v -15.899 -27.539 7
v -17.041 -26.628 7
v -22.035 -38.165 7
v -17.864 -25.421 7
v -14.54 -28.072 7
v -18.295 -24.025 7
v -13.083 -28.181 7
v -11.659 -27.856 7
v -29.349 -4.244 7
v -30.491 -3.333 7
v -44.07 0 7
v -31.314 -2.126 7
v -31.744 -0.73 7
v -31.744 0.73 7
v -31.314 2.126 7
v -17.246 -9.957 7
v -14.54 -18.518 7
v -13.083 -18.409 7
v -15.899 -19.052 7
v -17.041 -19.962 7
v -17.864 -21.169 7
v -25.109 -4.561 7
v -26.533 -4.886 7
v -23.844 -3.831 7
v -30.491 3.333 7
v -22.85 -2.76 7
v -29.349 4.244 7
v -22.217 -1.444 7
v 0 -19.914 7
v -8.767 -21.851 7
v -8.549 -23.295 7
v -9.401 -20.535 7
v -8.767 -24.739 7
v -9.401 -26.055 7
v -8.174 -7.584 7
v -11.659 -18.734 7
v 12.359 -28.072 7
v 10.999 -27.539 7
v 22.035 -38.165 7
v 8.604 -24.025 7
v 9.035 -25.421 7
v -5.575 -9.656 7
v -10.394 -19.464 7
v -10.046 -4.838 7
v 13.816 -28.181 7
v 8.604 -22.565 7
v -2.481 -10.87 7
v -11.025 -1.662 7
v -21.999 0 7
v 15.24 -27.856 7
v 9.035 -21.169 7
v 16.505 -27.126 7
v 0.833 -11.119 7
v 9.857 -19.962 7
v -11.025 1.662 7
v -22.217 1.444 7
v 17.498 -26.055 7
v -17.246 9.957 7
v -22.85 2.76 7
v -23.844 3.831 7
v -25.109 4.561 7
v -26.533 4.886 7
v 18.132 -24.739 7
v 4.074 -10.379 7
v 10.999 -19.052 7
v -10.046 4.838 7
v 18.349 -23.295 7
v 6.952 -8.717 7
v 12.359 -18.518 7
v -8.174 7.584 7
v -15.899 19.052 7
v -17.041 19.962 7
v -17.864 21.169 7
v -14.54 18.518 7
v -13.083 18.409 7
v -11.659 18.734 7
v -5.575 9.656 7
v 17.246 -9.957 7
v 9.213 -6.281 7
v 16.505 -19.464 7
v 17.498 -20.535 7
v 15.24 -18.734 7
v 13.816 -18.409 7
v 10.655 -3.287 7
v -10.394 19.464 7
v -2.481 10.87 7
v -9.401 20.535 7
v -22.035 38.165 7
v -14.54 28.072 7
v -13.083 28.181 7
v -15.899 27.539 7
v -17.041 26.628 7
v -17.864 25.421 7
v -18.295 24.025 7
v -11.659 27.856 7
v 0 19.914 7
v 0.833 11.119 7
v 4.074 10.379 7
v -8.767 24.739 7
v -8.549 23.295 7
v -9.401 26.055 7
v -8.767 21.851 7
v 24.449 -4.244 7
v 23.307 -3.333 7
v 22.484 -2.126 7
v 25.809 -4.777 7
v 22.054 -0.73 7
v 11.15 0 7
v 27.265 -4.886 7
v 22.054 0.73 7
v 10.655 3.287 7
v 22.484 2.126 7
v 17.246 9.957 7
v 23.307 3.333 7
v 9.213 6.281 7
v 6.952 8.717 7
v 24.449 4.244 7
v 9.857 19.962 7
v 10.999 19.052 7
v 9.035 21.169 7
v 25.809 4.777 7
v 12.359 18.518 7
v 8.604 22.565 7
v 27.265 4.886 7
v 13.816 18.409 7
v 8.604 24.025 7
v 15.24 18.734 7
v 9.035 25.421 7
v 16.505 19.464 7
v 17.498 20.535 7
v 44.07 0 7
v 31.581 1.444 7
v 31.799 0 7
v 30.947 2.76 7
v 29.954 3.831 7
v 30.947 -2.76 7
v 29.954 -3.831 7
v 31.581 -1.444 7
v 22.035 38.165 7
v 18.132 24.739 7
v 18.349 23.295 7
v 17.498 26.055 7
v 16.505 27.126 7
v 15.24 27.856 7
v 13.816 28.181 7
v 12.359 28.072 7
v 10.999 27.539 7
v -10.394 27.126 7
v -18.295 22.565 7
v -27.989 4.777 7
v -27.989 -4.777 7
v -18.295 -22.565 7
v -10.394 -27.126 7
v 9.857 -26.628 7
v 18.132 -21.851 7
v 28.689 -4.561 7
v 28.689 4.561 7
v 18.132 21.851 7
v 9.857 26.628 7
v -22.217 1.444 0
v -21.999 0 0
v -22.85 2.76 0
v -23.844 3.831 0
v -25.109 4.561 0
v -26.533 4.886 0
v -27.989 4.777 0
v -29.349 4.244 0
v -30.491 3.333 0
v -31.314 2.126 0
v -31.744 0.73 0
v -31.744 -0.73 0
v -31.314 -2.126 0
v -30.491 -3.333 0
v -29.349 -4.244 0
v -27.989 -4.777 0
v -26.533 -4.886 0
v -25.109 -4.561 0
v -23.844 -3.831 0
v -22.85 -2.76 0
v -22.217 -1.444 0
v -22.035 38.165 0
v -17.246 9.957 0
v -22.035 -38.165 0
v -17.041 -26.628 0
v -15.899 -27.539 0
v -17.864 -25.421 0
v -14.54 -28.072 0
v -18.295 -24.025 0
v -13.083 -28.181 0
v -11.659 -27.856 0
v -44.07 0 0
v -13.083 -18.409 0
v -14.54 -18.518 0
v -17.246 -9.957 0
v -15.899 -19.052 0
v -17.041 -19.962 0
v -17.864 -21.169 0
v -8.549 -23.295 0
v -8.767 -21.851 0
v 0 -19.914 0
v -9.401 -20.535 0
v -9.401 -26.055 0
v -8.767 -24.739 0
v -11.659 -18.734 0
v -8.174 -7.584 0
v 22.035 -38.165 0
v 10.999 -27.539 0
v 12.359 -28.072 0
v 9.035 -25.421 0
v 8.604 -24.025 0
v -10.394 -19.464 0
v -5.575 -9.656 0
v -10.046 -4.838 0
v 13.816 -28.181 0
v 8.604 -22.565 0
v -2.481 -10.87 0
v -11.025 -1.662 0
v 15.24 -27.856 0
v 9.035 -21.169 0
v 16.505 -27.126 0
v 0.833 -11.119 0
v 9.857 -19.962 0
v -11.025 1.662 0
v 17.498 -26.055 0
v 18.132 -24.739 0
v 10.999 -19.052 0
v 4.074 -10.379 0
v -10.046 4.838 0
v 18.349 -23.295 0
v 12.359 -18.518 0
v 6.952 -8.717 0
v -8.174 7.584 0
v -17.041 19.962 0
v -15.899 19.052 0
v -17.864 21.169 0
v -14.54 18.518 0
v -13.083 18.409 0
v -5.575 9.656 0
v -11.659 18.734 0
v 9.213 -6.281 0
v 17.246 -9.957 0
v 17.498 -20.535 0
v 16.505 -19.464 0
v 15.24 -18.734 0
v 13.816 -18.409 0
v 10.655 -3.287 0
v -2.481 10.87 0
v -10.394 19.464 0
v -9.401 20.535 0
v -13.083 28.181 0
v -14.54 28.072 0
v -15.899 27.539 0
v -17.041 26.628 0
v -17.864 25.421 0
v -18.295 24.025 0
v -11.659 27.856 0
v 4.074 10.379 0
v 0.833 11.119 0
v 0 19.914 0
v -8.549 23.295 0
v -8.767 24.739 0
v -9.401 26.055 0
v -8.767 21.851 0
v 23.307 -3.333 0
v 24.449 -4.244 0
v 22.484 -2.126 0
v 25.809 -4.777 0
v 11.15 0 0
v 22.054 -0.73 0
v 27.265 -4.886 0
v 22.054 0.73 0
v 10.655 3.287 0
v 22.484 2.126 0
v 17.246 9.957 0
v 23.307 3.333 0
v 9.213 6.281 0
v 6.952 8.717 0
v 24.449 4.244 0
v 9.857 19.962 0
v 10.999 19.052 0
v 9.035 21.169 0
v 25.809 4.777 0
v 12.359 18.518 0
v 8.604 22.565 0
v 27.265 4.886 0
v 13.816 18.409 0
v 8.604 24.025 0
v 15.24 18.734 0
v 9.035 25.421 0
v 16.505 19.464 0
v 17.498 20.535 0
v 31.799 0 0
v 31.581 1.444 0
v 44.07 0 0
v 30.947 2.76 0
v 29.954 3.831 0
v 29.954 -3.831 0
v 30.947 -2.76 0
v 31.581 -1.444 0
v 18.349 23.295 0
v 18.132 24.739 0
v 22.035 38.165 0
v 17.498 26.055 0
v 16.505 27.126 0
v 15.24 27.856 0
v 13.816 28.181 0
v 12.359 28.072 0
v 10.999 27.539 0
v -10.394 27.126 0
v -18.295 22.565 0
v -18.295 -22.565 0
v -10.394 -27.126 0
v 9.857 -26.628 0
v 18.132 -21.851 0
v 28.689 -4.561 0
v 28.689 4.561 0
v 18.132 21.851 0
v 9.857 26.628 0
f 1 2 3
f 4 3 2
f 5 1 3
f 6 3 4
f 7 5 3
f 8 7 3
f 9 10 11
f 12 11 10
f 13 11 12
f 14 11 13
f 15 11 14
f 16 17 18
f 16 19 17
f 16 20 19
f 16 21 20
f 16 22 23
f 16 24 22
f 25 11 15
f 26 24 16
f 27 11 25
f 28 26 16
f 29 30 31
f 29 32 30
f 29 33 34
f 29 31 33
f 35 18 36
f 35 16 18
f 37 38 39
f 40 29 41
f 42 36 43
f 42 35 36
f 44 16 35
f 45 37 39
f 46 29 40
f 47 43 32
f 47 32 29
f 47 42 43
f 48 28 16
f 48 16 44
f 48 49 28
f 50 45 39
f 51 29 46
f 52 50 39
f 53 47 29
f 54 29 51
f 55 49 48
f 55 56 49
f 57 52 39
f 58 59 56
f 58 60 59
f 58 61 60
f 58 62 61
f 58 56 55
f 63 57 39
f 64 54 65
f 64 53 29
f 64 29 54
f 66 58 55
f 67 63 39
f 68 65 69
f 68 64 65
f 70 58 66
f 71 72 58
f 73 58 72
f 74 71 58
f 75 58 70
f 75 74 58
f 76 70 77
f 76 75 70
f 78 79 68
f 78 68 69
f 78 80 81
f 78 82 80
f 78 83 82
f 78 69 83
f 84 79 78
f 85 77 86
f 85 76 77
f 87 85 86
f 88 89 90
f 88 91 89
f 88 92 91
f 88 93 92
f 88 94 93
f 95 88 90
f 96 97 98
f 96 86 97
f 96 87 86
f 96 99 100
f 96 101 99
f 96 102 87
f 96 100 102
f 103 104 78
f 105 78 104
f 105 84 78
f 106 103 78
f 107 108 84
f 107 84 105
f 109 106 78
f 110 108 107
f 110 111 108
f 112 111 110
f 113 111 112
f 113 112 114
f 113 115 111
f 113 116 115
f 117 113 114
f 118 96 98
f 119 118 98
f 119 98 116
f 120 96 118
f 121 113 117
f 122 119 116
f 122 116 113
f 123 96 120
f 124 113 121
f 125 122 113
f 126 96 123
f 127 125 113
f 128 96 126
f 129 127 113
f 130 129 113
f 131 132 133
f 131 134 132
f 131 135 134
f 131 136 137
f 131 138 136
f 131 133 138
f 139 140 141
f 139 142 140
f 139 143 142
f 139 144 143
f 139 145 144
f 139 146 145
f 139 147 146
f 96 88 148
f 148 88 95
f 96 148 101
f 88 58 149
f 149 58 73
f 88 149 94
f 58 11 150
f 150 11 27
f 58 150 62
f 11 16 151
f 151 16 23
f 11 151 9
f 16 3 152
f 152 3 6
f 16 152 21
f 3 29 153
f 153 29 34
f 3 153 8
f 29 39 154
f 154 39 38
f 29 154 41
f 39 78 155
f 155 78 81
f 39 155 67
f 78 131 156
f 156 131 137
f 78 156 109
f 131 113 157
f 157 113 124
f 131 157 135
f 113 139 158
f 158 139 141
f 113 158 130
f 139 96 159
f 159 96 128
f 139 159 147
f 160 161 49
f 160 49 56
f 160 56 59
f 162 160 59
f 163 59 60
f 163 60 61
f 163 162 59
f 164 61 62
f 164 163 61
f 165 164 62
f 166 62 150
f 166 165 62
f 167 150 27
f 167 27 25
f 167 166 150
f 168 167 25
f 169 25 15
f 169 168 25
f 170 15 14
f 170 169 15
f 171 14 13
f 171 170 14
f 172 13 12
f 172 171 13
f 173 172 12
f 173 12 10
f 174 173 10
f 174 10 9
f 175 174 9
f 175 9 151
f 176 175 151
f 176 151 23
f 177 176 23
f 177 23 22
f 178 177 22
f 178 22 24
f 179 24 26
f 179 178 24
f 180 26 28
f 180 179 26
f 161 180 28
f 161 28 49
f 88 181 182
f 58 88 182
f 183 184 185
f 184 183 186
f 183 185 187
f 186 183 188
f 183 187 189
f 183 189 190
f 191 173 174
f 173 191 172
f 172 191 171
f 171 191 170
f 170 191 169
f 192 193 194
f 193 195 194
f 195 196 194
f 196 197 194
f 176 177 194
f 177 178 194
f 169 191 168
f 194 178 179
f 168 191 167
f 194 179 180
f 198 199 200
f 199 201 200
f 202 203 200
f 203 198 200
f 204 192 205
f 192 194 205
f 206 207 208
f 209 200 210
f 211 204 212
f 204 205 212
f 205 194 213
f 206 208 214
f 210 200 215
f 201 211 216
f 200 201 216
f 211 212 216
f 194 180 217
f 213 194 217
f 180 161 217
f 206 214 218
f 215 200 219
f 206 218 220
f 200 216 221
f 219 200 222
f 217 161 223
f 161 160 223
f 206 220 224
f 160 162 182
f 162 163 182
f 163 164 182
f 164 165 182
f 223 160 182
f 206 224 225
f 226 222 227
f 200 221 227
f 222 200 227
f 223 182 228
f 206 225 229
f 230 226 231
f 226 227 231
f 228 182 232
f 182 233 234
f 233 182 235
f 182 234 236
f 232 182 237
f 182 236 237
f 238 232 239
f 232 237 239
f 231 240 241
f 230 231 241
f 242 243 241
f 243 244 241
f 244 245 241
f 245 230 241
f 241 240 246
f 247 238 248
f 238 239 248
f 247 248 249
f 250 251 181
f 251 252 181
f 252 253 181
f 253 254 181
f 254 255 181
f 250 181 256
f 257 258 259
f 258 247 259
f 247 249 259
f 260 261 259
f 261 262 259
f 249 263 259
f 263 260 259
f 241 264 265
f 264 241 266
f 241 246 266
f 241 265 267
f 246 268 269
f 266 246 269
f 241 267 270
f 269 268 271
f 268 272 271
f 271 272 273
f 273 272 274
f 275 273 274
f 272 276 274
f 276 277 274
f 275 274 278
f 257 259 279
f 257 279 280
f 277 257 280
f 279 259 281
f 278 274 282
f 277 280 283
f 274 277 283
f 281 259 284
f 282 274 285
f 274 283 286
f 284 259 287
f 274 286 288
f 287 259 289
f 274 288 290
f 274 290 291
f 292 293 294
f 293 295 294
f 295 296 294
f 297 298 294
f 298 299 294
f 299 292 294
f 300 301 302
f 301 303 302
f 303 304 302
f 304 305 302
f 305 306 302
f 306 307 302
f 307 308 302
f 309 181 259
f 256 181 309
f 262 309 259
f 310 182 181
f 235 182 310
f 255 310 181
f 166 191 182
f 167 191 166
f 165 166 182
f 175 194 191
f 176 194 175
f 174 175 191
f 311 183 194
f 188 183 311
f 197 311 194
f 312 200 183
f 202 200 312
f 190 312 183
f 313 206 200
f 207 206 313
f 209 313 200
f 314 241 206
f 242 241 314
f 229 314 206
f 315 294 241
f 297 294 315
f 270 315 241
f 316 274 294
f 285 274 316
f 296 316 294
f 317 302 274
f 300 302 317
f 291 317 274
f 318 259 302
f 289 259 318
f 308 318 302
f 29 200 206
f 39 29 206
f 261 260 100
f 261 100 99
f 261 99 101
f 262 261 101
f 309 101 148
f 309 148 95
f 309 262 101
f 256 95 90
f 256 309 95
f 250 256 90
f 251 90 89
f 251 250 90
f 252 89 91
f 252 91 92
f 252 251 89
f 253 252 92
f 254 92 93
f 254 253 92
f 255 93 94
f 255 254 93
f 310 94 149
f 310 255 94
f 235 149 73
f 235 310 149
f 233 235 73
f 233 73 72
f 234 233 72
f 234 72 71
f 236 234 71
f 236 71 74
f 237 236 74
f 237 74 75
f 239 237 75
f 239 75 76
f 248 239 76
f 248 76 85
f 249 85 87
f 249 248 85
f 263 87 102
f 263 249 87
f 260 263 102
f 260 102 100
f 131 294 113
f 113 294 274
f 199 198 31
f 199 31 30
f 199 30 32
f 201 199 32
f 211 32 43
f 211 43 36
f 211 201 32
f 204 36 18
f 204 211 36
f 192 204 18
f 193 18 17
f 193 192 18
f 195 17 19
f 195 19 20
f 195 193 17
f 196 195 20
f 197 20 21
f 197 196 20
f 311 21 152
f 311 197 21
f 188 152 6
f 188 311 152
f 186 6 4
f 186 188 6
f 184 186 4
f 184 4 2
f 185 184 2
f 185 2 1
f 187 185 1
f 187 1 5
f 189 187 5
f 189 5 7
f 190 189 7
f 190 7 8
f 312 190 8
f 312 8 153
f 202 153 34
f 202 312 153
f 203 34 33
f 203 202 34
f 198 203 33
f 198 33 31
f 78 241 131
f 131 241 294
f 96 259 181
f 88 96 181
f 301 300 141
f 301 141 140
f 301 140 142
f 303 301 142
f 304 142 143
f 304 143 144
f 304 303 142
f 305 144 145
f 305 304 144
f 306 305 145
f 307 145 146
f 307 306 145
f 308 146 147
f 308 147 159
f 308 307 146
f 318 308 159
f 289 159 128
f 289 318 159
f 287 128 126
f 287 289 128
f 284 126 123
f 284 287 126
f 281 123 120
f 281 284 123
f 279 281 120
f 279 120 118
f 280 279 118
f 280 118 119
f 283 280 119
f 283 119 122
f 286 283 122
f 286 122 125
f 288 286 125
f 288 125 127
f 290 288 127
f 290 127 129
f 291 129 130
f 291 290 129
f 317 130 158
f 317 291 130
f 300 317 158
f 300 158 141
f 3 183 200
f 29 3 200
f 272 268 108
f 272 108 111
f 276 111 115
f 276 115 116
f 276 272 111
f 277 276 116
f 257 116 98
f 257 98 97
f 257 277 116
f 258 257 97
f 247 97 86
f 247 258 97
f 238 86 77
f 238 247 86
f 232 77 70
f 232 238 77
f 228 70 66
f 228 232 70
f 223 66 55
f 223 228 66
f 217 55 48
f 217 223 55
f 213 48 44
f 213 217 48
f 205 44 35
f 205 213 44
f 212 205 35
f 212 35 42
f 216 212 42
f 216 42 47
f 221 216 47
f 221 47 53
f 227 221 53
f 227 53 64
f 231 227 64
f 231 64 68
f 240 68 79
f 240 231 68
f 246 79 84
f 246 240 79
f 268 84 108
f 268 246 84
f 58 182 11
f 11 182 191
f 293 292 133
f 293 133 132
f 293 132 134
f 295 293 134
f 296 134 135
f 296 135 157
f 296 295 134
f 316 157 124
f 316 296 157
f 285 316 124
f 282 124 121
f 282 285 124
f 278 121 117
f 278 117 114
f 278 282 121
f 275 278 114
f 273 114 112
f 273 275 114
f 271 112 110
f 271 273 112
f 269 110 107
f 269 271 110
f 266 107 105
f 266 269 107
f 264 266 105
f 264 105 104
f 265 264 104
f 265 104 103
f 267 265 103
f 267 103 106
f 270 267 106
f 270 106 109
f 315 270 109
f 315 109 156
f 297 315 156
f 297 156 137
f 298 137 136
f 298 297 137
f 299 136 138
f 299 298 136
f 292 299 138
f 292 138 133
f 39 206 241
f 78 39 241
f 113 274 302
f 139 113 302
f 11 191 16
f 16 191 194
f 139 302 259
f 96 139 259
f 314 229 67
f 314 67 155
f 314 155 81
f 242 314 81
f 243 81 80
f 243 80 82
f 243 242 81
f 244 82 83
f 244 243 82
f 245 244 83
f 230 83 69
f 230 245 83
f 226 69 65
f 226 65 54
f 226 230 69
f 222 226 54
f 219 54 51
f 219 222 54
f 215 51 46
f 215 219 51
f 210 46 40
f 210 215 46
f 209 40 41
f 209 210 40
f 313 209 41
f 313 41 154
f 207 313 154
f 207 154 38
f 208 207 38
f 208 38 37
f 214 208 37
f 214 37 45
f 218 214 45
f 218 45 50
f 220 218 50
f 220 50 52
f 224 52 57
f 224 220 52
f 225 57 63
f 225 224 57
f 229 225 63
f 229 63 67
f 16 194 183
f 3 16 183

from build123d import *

# Parameters (mm, degrees)
F0_R     = 4.9
F0_R_2   = 11.15
F1_DEPTH = 7


with BuildPart() as f1:
    # F0 (on Top) → F1 (new body)
    with BuildSketch(Plane.XY):
        Polygon((-7.7780097821, 13.4719081244), (0, 19.9143218109), (-22.0348406583, 38.1654635569), (-17.2463085873, 9.9571609054), align=None)
        with Locations((-13.4494397789, 23.2951130304)):
            Circle(F0_R, mode=Mode.SUBTRACT)
        with BuildLine():
            ThreePointArc((-6.4179147594, 13.9767918736), (0, 15.3798680403), (6.4179147594, 13.9767918736))
            Line((6.4179147594, 13.9767918736), (7.7780097821, 13.4719081244))
            Line((7.7780097821, 13.4719081244), (0, 19.9143218109))
            Line((0, 19.9143218109), (-7.7780097821, 13.4719081244))
            Line((-7.7780097821, 13.4719081244), (-6.4179147594, 13.9767918736))
        make_face()
        Polygon((0, 19.9143218109), (7.7780097821, 13.4719081244), (17.2463085873, 9.9571609054), (22.0348406583, 38.1654635569), align=None)
        with Locations((13.4494397789, 23.2951130304)):
            Circle(F0_R, mode=Mode.SUBTRACT)
        with BuildLine():
            ThreePointArc((8.8952994462, 12.5464731577), (13.3193564297, 7.6899340201), (15.3132142056, 1.4303187159))
            Line((15.3132142056, 1.4303187159), (15.5560195643, 0))
            Line((15.5560195643, 0), (17.2463085873, 9.9571609054))
            Line((17.2463085873, 9.9571609054), (7.7780097821, 13.4719081244))
            Line((7.7780097821, 13.4719081244), (8.8952994462, 12.5464731577))
        make_face()
        Polygon((17.2463085873, 9.9571609054), (15.5560195643, 0), (17.2463085873, -9.9571609054), (44.0696813166, 0), align=None)
        with Locations((26.8988795578, 0)):
            Circle(F0_R, mode=Mode.SUBTRACT)
        with BuildLine():
            ThreePointArc((15.3132142056, -1.4303187159), (15.3631955447, -0.7159354654), (15.3798680403, 0))
            ThreePointArc((15.3798680403, 0), (15.3631955447, 0.7159354654), (15.3132142056, 1.4303187159))
            ThreePointArc((15.3132142056, 1.4303187159), (13.3193564297, 7.6899340201), (8.8952994462, 12.5464731577))
            ThreePointArc((8.8952994462, 12.5464731577), (7.6899340201, 13.3193564297), (6.4179147594, 13.9767918736))
            ThreePointArc((6.4179147594, 13.9767918736), (0, 15.3798680403), (-6.4179147594, 13.9767918736))
            ThreePointArc((-6.4179147594, 13.9767918736), (-7.6899340201, 13.3193564297), (-8.8952994462, 12.5464731577))
            ThreePointArc((-8.8952994462, 12.5464731577), (-13.3193564297, 7.6899340201), (-15.3132142056, 1.4303187159))
            ThreePointArc((-15.3132142056, 1.4303187159), (-15.3798680403, 0), (-15.3132142056, -1.4303187159))
            ThreePointArc((-15.3132142056, -1.4303187159), (-13.3193564297, -7.6899340201), (-8.8952994462, -12.5464731577))
            ThreePointArc((-8.8952994462, -12.5464731577), (-7.6899340201, -13.3193564297), (-6.4179147594, -13.9767918736))
            ThreePointArc((-6.4179147594, -13.9767918736), (0, -15.3798680403), (6.4179147594, -13.9767918736))
            ThreePointArc((6.4179147594, -13.9767918736), (7.6899340201, -13.3193564297), (8.8952994462, -12.5464731577))
            ThreePointArc((8.8952994462, -12.5464731577), (13.3193564297, -7.6899340201), (15.3132142056, -1.4303187159))
        make_face()
        Circle(F0_R_2, mode=Mode.SUBTRACT)
        with BuildLine():
            Line((15.5560195643, 0), (15.3132142056, -1.4303187159))
            ThreePointArc((15.3132142056, -1.4303187159), (13.3193564297, -7.6899340201), (8.8952994462, -12.5464731577))
            Line((8.8952994462, -12.5464731577), (7.7780097821, -13.4719081244))
            Line((7.7780097821, -13.4719081244), (17.2463085873, -9.9571609054))
            Line((17.2463085873, -9.9571609054), (15.5560195643, 0))
        make_face()
        Polygon((22.0348406583, -38.1654635569), (17.2463085873, -9.9571609054), (7.7780097821, -13.4719081244), (0, -19.9143218109), align=None)
        with Locations((13.4494397789, -23.2951130304)):
            Circle(F0_R, mode=Mode.SUBTRACT)
        with BuildLine():
            Line((7.7780097821, -13.4719081244), (6.4179147594, -13.9767918736))
            ThreePointArc((6.4179147594, -13.9767918736), (0, -15.3798680403), (-6.4179147594, -13.9767918736))
            Line((-6.4179147594, -13.9767918736), (-7.7780097821, -13.4719081244))
            Line((-7.7780097821, -13.4719081244), (0, -19.9143218109))
            Line((0, -19.9143218109), (7.7780097821, -13.4719081244))
        make_face()
        Polygon((-22.0348406583, -38.1654635569), (0, -19.9143218109), (-7.7780097821, -13.4719081244), (-17.2463085873, -9.9571609054), align=None)
        with Locations((-13.4494397789, -23.2951130304)):
            Circle(F0_R, mode=Mode.SUBTRACT)
        with BuildLine():
            Line((-7.7780097821, -13.4719081244), (-8.8952994462, -12.5464731577))
            ThreePointArc((-8.8952994462, -12.5464731577), (-13.3193564297, -7.6899340201), (-15.3132142056, -1.4303187159))
            Line((-15.3132142056, -1.4303187159), (-15.5560195643, 0))
            Line((-15.5560195643, 0), (-17.2463085873, -9.9571609054))
            Line((-17.2463085873, -9.9571609054), (-7.7780097821, -13.4719081244))
        make_face()
        Polygon((-15.5560195643, 0), (-17.2463085873, 9.9571609054), (-44.0696813166, 0), (-17.2463085873, -9.9571609054), align=None)
        with Locations((-26.8988795578, 0)):
            Circle(F0_R, mode=Mode.SUBTRACT)
        with BuildLine():
            ThreePointArc((-15.3132142056, 1.4303187159), (-13.3193564297, 7.6899340201), (-8.8952994462, 12.5464731577))
            Line((-8.8952994462, 12.5464731577), (-7.7780097821, 13.4719081244))
            Line((-7.7780097821, 13.4719081244), (-17.2463085873, 9.9571609054))
            Line((-17.2463085873, 9.9571609054), (-15.5560195643, 0))
            Line((-15.5560195643, 0), (-15.3132142056, 1.4303187159))
        make_face()
        with BuildLine():
            ThreePointArc((6.4179147594, 13.9767918736), (7.6899340201, 13.3193564297), (8.8952994462, 12.5464731577))
            Line((8.8952994462, 12.5464731577), (7.7780097821, 13.4719081244))
            Line((7.7780097821, 13.4719081244), (6.4179147594, 13.9767918736))
        make_face()
        with BuildLine():
            ThreePointArc((-8.8952994462, 12.5464731577), (-7.6899340201, 13.3193564297), (-6.4179147594, 13.9767918736))
            Line((-6.4179147594, 13.9767918736), (-7.7780097821, 13.4719081244))
            Line((-7.7780097821, 13.4719081244), (-8.8952994462, 12.5464731577))
        make_face()
        with BuildLine():
            ThreePointArc((-15.3132142056, -1.4303187159), (-15.3798680403, 0), (-15.3132142056, 1.4303187159))
            Line((-15.3132142056, 1.4303187159), (-15.5560195643, 0))
            Line((-15.5560195643, 0), (-15.3132142056, -1.4303187159))
        make_face()
        with BuildLine():
            Line((-7.7780097821, -13.4719081244), (-6.4179147594, -13.9767918736))
            ThreePointArc((-6.4179147594, -13.9767918736), (-7.6899340201, -13.3193564297), (-8.8952994462, -12.5464731577))
            Line((-8.8952994462, -12.5464731577), (-7.7780097821, -13.4719081244))
        make_face()
        with BuildLine():
            Line((7.7780097821, -13.4719081244), (8.8952994462, -12.5464731577))
            ThreePointArc((8.8952994462, -12.5464731577), (7.6899340201, -13.3193564297), (6.4179147594, -13.9767918736))
            Line((6.4179147594, -13.9767918736), (7.7780097821, -13.4719081244))
        make_face()
        with BuildLine():
            ThreePointArc((15.3132142056, 1.4303187159), (15.3631955447, 0.7159354654), (15.3798680403, 0))
            ThreePointArc((15.3798680403, 0), (15.3631955447, -0.7159354654), (15.3132142056, -1.4303187159))
            Line((15.3132142056, -1.4303187159), (15.5560195643, 0))
            Line((15.5560195643, 0), (15.3132142056, 1.4303187159))
        make_face()
    extrude(amount=F1_DEPTH)


solid = f1.part
